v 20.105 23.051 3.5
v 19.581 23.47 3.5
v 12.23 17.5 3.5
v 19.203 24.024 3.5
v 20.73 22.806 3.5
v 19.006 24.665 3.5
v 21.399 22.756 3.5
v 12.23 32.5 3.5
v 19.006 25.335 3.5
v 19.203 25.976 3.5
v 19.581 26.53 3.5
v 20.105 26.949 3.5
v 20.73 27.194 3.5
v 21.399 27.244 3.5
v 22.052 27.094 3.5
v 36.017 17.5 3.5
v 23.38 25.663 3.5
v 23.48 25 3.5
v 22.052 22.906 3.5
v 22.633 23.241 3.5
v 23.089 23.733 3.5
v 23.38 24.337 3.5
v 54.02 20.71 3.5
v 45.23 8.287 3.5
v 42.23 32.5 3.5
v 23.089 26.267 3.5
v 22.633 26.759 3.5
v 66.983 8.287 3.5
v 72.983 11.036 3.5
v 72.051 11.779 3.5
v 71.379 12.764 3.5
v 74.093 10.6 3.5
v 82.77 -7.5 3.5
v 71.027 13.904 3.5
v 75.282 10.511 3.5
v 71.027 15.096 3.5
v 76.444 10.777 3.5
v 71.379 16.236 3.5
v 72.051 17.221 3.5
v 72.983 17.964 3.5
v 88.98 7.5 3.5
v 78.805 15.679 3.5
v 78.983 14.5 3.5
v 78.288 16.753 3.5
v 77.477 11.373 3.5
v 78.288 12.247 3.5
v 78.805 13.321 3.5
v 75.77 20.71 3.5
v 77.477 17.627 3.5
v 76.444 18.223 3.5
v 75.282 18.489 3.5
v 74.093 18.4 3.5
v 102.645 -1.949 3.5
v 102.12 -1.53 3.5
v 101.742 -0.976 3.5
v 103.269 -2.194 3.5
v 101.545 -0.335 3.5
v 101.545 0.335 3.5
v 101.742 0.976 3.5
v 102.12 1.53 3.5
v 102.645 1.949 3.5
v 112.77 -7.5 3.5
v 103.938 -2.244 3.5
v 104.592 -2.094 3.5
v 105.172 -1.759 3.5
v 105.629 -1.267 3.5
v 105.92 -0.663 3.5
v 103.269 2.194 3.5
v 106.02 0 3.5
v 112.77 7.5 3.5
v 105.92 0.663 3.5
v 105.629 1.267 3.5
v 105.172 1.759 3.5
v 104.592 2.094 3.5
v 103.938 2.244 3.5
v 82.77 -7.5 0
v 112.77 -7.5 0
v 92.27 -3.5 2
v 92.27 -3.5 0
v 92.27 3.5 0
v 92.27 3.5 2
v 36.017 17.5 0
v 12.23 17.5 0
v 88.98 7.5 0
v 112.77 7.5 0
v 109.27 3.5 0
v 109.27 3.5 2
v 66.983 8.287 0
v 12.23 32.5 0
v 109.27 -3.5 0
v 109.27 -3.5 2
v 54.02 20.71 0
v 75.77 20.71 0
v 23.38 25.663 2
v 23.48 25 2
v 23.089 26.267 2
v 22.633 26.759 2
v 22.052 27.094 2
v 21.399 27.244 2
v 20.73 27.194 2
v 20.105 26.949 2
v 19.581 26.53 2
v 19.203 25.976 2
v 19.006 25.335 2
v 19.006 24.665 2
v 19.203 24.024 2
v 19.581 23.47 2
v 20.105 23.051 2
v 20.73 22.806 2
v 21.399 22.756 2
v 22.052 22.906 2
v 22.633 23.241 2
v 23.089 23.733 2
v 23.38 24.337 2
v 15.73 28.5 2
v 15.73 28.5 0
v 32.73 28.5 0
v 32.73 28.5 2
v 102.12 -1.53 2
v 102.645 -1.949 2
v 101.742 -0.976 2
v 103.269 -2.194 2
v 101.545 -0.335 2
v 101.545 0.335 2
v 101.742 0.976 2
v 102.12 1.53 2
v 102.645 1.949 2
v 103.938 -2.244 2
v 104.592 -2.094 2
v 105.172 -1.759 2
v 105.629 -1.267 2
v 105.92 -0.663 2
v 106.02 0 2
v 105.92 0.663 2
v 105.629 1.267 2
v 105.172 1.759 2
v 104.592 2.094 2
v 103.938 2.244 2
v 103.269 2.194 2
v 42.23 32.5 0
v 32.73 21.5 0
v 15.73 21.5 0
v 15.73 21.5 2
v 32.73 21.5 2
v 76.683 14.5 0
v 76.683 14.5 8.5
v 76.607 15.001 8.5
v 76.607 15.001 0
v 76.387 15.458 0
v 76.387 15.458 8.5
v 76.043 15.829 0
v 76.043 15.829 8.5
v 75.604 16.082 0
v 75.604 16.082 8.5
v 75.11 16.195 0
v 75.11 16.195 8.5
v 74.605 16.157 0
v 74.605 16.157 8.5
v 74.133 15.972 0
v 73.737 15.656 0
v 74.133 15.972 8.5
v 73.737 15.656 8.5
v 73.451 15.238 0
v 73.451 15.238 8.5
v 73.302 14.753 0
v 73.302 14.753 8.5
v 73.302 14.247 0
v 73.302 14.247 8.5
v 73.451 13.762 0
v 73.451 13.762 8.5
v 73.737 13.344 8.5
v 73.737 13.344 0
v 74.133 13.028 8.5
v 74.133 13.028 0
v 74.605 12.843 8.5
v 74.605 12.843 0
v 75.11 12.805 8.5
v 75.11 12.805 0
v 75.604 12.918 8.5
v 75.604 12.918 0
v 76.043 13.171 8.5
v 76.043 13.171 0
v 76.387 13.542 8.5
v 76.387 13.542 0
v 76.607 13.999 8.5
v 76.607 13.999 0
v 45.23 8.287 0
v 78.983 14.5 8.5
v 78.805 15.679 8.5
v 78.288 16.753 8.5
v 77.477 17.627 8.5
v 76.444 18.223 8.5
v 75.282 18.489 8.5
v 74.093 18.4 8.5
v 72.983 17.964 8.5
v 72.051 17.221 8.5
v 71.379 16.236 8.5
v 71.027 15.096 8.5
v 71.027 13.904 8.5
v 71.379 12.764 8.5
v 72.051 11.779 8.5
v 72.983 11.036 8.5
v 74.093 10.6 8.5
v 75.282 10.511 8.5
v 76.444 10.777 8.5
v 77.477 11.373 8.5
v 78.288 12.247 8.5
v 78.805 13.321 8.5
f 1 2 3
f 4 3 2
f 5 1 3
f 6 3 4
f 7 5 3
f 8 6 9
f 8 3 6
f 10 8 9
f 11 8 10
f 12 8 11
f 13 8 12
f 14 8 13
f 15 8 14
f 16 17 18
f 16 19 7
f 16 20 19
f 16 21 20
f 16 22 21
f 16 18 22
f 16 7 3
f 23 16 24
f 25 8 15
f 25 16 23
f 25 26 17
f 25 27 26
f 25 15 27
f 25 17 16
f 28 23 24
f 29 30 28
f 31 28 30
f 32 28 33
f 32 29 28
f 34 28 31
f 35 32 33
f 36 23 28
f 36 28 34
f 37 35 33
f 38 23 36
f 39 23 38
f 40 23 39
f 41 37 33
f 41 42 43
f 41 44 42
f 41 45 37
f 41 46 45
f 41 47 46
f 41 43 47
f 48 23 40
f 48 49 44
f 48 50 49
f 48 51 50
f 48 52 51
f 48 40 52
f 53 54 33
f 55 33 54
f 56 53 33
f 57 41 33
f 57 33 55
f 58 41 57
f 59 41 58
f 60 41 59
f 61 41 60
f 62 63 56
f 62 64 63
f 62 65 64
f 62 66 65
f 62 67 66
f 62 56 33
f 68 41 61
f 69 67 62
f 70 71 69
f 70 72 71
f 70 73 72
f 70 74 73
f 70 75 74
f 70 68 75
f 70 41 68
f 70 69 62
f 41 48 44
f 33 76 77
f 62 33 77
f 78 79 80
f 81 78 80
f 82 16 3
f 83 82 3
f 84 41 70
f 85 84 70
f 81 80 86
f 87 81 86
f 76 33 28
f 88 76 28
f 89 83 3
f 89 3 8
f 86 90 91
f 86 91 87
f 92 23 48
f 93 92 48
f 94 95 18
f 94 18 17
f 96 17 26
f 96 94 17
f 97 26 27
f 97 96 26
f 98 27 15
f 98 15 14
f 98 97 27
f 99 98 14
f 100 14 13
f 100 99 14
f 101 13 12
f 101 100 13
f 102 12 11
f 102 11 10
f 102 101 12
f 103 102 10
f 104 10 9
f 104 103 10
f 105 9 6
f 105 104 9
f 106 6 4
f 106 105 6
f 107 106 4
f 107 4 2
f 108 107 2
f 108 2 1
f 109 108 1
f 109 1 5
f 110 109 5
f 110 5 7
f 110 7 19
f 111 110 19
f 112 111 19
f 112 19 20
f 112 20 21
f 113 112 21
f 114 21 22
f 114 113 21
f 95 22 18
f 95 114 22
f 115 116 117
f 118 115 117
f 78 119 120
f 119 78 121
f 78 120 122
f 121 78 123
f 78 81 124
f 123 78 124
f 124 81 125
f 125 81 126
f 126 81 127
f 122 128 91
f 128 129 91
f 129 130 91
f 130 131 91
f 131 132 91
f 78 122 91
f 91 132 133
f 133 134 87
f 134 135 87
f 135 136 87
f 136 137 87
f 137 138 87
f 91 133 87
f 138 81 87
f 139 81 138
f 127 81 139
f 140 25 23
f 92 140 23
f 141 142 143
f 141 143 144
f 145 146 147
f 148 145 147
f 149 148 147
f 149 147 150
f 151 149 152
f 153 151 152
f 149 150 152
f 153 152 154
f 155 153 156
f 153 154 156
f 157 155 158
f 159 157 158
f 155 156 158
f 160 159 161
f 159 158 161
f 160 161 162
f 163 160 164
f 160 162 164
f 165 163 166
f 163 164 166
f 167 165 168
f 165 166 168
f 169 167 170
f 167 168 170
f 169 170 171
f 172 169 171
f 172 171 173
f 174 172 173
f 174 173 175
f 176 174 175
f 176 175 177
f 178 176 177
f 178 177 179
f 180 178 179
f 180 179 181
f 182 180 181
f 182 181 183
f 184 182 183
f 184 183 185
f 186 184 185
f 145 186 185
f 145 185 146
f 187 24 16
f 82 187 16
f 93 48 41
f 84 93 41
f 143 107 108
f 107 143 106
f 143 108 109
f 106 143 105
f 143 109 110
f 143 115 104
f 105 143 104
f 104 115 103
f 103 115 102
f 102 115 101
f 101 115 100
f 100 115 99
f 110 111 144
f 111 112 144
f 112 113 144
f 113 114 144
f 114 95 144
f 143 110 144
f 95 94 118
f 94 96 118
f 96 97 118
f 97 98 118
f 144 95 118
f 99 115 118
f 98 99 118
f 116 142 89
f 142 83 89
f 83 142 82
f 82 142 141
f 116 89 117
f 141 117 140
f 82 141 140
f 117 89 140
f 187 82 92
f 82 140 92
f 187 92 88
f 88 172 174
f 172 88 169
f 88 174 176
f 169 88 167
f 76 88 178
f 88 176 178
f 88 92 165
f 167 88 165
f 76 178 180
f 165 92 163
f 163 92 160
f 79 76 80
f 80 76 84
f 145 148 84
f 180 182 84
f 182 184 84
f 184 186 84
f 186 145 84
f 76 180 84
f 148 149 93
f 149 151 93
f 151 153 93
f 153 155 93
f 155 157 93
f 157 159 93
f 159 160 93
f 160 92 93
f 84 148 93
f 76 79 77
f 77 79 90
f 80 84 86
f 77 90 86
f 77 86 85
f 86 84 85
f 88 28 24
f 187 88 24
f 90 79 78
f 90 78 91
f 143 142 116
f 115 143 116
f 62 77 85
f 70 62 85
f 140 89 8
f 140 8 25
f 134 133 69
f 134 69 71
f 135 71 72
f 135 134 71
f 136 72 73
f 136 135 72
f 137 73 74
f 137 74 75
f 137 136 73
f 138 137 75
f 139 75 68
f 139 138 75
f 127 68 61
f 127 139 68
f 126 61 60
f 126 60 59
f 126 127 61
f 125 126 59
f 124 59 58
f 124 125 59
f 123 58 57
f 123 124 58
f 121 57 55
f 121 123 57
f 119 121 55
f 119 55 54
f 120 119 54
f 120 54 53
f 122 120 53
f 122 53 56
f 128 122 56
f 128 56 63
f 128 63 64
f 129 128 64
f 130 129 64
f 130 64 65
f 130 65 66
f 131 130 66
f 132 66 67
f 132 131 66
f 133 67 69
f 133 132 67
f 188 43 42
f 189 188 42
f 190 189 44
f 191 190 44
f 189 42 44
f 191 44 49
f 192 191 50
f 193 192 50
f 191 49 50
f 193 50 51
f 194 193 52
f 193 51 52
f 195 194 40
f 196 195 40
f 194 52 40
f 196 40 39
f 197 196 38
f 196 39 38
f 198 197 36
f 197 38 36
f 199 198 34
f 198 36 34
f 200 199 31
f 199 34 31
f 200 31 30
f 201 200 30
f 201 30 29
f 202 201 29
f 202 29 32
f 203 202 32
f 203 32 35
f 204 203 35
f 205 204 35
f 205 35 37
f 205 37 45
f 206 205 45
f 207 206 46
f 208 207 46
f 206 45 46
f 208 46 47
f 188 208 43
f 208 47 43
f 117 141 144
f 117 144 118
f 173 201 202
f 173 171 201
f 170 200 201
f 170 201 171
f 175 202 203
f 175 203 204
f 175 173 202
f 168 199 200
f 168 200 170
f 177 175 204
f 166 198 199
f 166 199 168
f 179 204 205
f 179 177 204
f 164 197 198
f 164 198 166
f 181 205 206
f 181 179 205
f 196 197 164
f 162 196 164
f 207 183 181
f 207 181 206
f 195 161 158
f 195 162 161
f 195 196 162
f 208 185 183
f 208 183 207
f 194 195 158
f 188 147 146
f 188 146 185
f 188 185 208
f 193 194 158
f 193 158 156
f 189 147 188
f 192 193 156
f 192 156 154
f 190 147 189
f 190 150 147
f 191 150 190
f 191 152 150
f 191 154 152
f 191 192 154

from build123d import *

# Parameters (mm, degrees)
SKETCH_1_W          = 100.539230484
SKETCH_1_H          = 40
SKETCH_1_W_2        = 17
SKETCH_1_H_2        = 7
EXTRUDE_1_DEPTH     = 2
SKETCH_2_W          = 100.539230484
SKETCH_2_H          = 40
SKETCH_2_R          = 2.25
EXTRUDE_2_DEPTH     = 1.5
SKETCH_3_W          = 184.808915215
SKETCH_3_H          = 94.825170589
CUT_EXTRUDE_1_DEPTH = 31.5
SKETCH_5_R          = 4
EXTRUDE_4_DEPTH     = 5
SKETCH_6_R          = 1.7
CUT_EXTRUDE_2_DEPTH = 10


with BuildPart() as part:
    # Эскиз1 → Бобышка-Вытянуть1 (new body)
    with BuildSketch(Plane.XY):
        with Locations((62.5, 12.5)):
            Rectangle(SKETCH_1_W, SKETCH_1_H)
        with Locations((24.230384758, 25)):
            Rectangle(SKETCH_1_W_2, SKETCH_1_H_2, mode=Mode.SUBTRACT)
        with Locations((100.769615242, 0)):
            Rectangle(SKETCH_1_W_2, SKETCH_1_H_2, mode=Mode.SUBTRACT)
    extrude(amount=EXTRUDE_1_DEPTH)

    # Эскиз2 → Бобышка-Вытянуть2 (add)
    with BuildSketch(Plane.XY.offset(2)):
        with Locations((62.5, 12.5)):
            Rectangle(SKETCH_2_W, SKETCH_2_H)
        with Locations((21.230384758, 25)):
            Circle(SKETCH_2_R, mode=Mode.SUBTRACT)
        with Locations((103.769615242, 0)):
            Circle(SKETCH_2_R, mode=Mode.SUBTRACT)
    extrude(amount=EXTRUDE_2_DEPTH)

    # Эскиз3 → Вырез-Вытянуть1 (cut)
    with BuildSketch(Plane.XY.offset(3.5)):
        with Locations((81.231416835, 7.831688581)):
            Rectangle(SKETCH_3_W, SKETCH_3_H)
        Polygon((12.230384758, 32.5), (42.230384758, 32.5), (54.020384758, 20.71), (75.769615242, 20.71), (88.979615242, 7.5), (112.769615242, 7.5), (112.769615242, -7.5), (82.769615242, -7.5), (66.982818678, 8.286796564), (45.230384758, 8.286796564), (36.017181322, 17.5), (12.230384758, 17.5), align=None, mode=Mode.SUBTRACT)
    extrude(amount=-CUT_EXTRUDE_1_DEPTH, mode=Mode.SUBTRACT)

    # Эскиз5 → Бобышка-Вытянуть4 (add)
    with BuildSketch(Plane.XY.offset(3.5)):
        with Locations((74.982818678, 14.5)):
            Circle(SKETCH_5_R)
    extrude(amount=EXTRUDE_4_DEPTH)

    # Эскиз6 → Вырез-Вытянуть2 (cut)
    with BuildSketch(Plane.XY.offset(8.5)):
        with Locations((74.982818678, 14.5)):
            Circle(SKETCH_6_R)
    extrude(amount=-CUT_EXTRUDE_2_DEPTH, mode=Mode.SUBTRACT)


solid = part.part
